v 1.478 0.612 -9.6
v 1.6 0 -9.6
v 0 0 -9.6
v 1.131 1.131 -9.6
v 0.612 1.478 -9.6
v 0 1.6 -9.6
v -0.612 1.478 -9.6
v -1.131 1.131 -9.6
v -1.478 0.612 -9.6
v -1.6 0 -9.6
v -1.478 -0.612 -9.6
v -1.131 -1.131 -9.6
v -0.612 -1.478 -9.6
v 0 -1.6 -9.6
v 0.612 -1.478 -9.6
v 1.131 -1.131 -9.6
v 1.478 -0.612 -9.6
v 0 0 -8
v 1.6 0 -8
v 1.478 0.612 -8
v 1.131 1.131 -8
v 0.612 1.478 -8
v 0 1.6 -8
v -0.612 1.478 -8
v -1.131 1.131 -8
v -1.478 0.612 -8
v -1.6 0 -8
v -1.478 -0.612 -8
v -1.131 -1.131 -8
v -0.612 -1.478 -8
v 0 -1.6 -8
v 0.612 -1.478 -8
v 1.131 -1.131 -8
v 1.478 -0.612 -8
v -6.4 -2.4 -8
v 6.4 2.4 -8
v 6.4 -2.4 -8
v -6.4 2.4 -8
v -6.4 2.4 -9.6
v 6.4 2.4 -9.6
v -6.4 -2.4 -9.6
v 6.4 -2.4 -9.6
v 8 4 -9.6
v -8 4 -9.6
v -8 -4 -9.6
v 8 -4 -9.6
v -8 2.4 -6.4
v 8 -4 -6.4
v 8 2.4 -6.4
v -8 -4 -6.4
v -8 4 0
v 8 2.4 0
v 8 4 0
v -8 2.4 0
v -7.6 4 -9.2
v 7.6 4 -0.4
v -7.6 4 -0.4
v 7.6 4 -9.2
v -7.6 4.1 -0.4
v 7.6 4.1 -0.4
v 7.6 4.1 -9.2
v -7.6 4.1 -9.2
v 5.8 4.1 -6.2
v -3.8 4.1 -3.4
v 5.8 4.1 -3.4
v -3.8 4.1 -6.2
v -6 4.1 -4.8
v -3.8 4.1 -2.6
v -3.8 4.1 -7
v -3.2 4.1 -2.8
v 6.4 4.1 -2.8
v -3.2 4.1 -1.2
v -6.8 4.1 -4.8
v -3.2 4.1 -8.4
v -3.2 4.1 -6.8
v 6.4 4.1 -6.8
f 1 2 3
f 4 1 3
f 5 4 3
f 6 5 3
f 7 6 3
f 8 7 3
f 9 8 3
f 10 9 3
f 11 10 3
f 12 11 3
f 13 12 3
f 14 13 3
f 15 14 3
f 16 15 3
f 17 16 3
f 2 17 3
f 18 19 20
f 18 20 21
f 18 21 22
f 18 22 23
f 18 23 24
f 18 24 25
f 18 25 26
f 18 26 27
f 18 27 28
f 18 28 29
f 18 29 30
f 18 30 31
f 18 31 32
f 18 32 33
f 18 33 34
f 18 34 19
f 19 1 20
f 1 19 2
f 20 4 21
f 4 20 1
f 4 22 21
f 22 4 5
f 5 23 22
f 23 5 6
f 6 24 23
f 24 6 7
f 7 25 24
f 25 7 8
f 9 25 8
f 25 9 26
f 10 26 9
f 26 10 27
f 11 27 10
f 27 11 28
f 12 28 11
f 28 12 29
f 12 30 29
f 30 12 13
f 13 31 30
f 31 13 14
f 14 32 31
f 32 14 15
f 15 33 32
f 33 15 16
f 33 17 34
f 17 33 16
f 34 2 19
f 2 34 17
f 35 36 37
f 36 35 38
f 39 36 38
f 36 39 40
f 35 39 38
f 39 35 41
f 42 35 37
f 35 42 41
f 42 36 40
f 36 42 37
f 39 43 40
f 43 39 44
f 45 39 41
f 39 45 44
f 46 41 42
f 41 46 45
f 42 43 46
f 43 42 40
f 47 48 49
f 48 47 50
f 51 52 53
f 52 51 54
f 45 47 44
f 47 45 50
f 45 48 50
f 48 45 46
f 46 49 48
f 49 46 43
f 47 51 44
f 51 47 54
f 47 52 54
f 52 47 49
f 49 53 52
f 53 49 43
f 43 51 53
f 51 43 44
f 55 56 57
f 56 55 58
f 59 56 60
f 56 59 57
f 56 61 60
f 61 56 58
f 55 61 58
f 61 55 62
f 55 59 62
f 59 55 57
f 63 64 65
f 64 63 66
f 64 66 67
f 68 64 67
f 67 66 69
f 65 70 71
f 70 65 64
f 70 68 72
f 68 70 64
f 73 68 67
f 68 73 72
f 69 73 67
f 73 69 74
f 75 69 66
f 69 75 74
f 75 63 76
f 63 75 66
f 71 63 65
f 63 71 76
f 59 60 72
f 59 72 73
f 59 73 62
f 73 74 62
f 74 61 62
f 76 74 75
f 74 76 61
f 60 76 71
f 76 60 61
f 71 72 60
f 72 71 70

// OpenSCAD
// file: ../p/4-4edge.scad
use <../lib.scad>
function ldraw_lib__4_4edge() = [
// 0 Circle 1.0
// 0 Name: 4-4edge.dat
// 0 Author: James Jessiman
// 0 !LDRAW_ORG Primitive UPDATE 2017-01
// 0 !LICENSE Licensed under CC BY 2.0 and CC BY 4.0 : see CAreadme.txt
// 
// 0 BFC CERTIFY CCW
  [0,"BFC","CERTIFY"],
  [0,"BFC","CCW"],
// 
// 0 !HISTORY 1998-12-15 [PTadmin] Official Update 1998-10
// 0 !HISTORY 2005-12-28 [PTadmin] Official Update 2005-01
// 0 !HISTORY 2007-06-24 [PTadmin] Header formatted for Contributor Agreement
// 0 !HISTORY 2008-07-01 [PTadmin] Official Update 2008-01
// 0 !HISTORY 2017-01-15 [Steffen] BFCed
// 0 !HISTORY 2017-12-30 [PTadmin] Official Update 2017-01
// 
// 
// 2 24 1 0 0 0.9239 0 0.3827
  [2,24,1,0,0,0.9239,0,0.3827],
// 2 24 0.9239 0 0.3827 0.7071 0 0.7071
  [2,24,0.9239,0,0.3827,0.7071,0,0.7071],
// 2 24 0.7071 0 0.7071 0.3827 0 0.9239
  [2,24,0.7071,0,0.7071,0.3827,0,0.9239],
// 2 24 0.3827 0 0.9239 0 0 1
  [2,24,0.3827,0,0.9239,0,0,1],
// 2 24 0 0 1 -0.3827 0 0.9239
  [2,24,0,0,1,-0.3827,0,0.9239],
// 2 24 -0.3827 0 0.9239 -0.7071 0 0.7071
  [2,24,-0.3827,0,0.9239,-0.7071,0,0.7071],
// 2 24 -0.7071 0 0.7071 -0.9239 0 0.3827
  [2,24,-0.7071,0,0.7071,-0.9239,0,0.3827],
// 2 24 -0.9239 0 0.3827 -1 0 -0
  [2,24,-0.9239,0,0.3827,-1,0,-0],
// 2 24 -1 0 -0 -0.9239 0 -0.3827
  [2,24,-1,0,-0,-0.9239,0,-0.3827],
// 2 24 -0.9239 0 -0.3827 -0.7071 0 -0.7071
  [2,24,-0.9239,0,-0.3827,-0.7071,0,-0.7071],
// 2 24 -0.7071 0 -0.7071 -0.3827 0 -0.9239
  [2,24,-0.7071,0,-0.7071,-0.3827,0,-0.9239],
// 2 24 -0.3827 0 -0.9239 0 0 -1
  [2,24,-0.3827,0,-0.9239,0,0,-1],
// 2 24 0 0 -1 0.3827 0 -0.9239
  [2,24,0,0,-1,0.3827,0,-0.9239],
// 2 24 0.3827 0 -0.9239 0.7071 0 -0.7071
  [2,24,0.3827,0,-0.9239,0.7071,0,-0.7071],
// 2 24 0.7071 0 -0.7071 0.9239 0 -0.3827
  [2,24,0.7071,0,-0.7071,0.9239,0,-0.3827],
// 2 24 0.9239 0 -0.3827 1 0 0
  [2,24,0.9239,0,-0.3827,1,0,0],
];
module ldraw_lib__4_4edge(step=0, col=false, unit=2/5, alt=false, line=0.2, solid=!$preview)
    makepoly(ldraw_lib__4_4edge(), step=step, col=col, unit=unit, alt=alt, line=line, solid=solid);
ldraw_lib__4_4edge(line=0.2);
// file: ../p/4-4disc.scad
use <../lib.scad>
function ldraw_lib__4_4disc() = [
// 0 Disc 1.0
// 0 Name: 4-4disc.dat
// 0 Author: James Jessiman
// 0 !LDRAW_ORG Primitive UPDATE 2002-02
// 0 !LICENSE Licensed under CC BY 2.0 and CC BY 4.0 : see CAreadme.txt
// 
// 0 BFC CERTIFY CCW
  [0,"BFC","CERTIFY"],
  [0,"BFC","CCW"],
// 
// 0 !HISTORY 1998-12-15 [PTadmin] Official Update 1998-10
// 0 !HISTORY 2002-03-23 [sbliss] Added BFC statement
// 0 !HISTORY 2002-04-25 [PTadmin] Official Update 2002-02
// 0 !HISTORY 2007-06-24 [PTadmin] Header formatted for Contributor Agreement
// 0 !HISTORY 2008-07-01 [PTadmin] Official Update 2008-01
// 
// 
// 3 16 0 0 0 1 0 0 0.9239 0 0.3827
  [3,16,0,0,0,1,0,0,0.9239,0,0.3827],
// 3 16 0 0 0 0.9239 0 0.3827 0.7071 0 0.7071
  [3,16,0,0,0,0.9239,0,0.3827,0.7071,0,0.7071],
// 3 16 0 0 0 0.7071 0 0.7071 0.3827 0 0.9239
  [3,16,0,0,0,0.7071,0,0.7071,0.3827,0,0.9239],
// 3 16 0 0 0 0.3827 0 0.9239 0 0 1
  [3,16,0,0,0,0.3827,0,0.9239,0,0,1],
// 3 16 0 0 0 0 0 1 -0.3827 0 0.9239
  [3,16,0,0,0,0,0,1,-0.3827,0,0.9239],
// 3 16 0 0 0 -0.3827 0 0.9239 -0.7071 0 0.7071
  [3,16,0,0,0,-0.3827,0,0.9239,-0.7071,0,0.7071],
// 3 16 0 0 0 -0.7071 0 0.7071 -0.9239 0 0.3827
  [3,16,0,0,0,-0.7071,0,0.7071,-0.9239,0,0.3827],
// 3 16 0 0 0 -0.9239 0 0.3827 -1 0 -0
  [3,16,0,0,0,-0.9239,0,0.3827,-1,0,-0],
// 3 16 0 0 0 -1 0 -0 -0.9239 0 -0.3827
  [3,16,0,0,0,-1,0,-0,-0.9239,0,-0.3827],
// 3 16 0 0 0 -0.9239 0 -0.3827 -0.7071 0 -0.7071
  [3,16,0,0,0,-0.9239,0,-0.3827,-0.7071,0,-0.7071],
// 3 16 0 0 0 -0.7071 0 -0.7071 -0.3827 0 -0.9239
  [3,16,0,0,0,-0.7071,0,-0.7071,-0.3827,0,-0.9239],
// 3 16 0 0 0 -0.3827 0 -0.9239 0 0 -1
  [3,16,0,0,0,-0.3827,0,-0.9239,0,0,-1],
// 3 16 0 0 0 0 0 -1 0.3827 0 -0.9239
  [3,16,0,0,0,0,0,-1,0.3827,0,-0.9239],
// 3 16 0 0 0 0.3827 0 -0.9239 0.7071 0 -0.7071
  [3,16,0,0,0,0.3827,0,-0.9239,0.7071,0,-0.7071],
// 3 16 0 0 0 0.7071 0 -0.7071 0.9239 0 -0.3827
  [3,16,0,0,0,0.7071,0,-0.7071,0.9239,0,-0.3827],
// 3 16 0 0 0 0.9239 0 -0.3827 1 0 0
  [3,16,0,0,0,0.9239,0,-0.3827,1,0,0],
// 0
];
module ldraw_lib__4_4disc(step=0, col=false, unit=2/5, alt=false, line=0.2, solid=!$preview)
    makepoly(ldraw_lib__4_4disc(), step=step, col=col, unit=unit, alt=alt, line=line, solid=solid);
ldraw_lib__4_4disc(line=0.2);
// file: ../p/4-4cyli.scad
use <../lib.scad>
$fa=1; $fs=0.2;
function ldraw_lib__4_4cyli(realsolid=false) = [
// 0 Cylinder 1.0
// 0 Name: 4-4cyli.dat
// 0 Author: James Jessiman
// 0 !LDRAW_ORG Primitive UPDATE 2005-01
// 0 !LICENSE Licensed under CC BY 2.0 and CC BY 4.0 : see CAreadme.txt
// 
// 0 BFC CERTIFY CCW
  [0,"BFC","CERTIFY"],
  [0,"BFC","CCW"],
// 
// 0 !HISTORY 1998-12-15 [PTadmin] Official Update 1998-10
// 0 !HISTORY 2002-03-23 [sbliss] Added BFC statement; merged headers from files in distributions LDraw 0.27 and Complete.
// 0 !HISTORY 2002-04-25 [PTadmin] Official Update 2002-02
// 0 !HISTORY 2004-12-14 [guyvivan] BFC CCW
// 0 !HISTORY 2005-12-28 [PTadmin] Official Update 2005-01
// 0 !HISTORY 2007-06-24 [PTadmin] Header formatted for Contributor Agreement
// 0 !HISTORY 2008-07-01 [PTadmin] Official Update 2008-01
// 
// 
// 4 16 1 1 0 0.9239 1 0.3827 0.9239 0 0.3827 1 0 0
  [4,16,1,1,0,0.9239,1,0.3827,0.9239,0,0.3827,1,0,0],
// 5 24 1 0 0 1 1 0 0.9239 0 0.3827 0.9239 0 -0.3827
  [5,24,1,0,0,1,1,0,0.9239,0,0.3827,0.9239,0,-0.3827],
// 4 16 0.9239 1 0.3827 0.7071 1 0.7071 0.7071 0 0.7071 0.9239 0 0.3827
  [4,16,0.9239,1,0.3827,0.7071,1,0.7071,0.7071,0,0.7071,0.9239,0,0.3827],
// 5 24 0.9239 0 0.3827 0.9239 1 0.3827 0.7071 0 0.7071 1 0 0
  [5,24,0.9239,0,0.3827,0.9239,1,0.3827,0.7071,0,0.7071,1,0,0],
// 4 16 0.7071 1 0.7071 0.3827 1 0.9239 0.3827 0 0.9239 0.7071 0 0.7071
  [4,16,0.7071,1,0.7071,0.3827,1,0.9239,0.3827,0,0.9239,0.7071,0,0.7071],
// 5 24 0.7071 0 0.7071 0.7071 1 0.7071 0.3827 0 0.9239 0.9239 0 0.3827
  [5,24,0.7071,0,0.7071,0.7071,1,0.7071,0.3827,0,0.9239,0.9239,0,0.3827],
// 4 16 0.3827 1 0.9239 0 1 1 0 0 1 0.3827 0 0.9239
  [4,16,0.3827,1,0.9239,0,1,1,0,0,1,0.3827,0,0.9239],
// 5 24 0.3827 0 0.9239 0.3827 1 0.9239 0 0 1 0.7071 0 0.7071
  [5,24,0.3827,0,0.9239,0.3827,1,0.9239,0,0,1,0.7071,0,0.7071],
// 4 16 0 1 1 -0.3827 1 0.9239 -0.3827 0 0.9239 0 0 1
  [4,16,0,1,1,-0.3827,1,0.9239,-0.3827,0,0.9239,0,0,1],
// 5 24 0 0 1 0 1 1 -0.3827 0 0.9239 0.3827 0 0.9239
  [5,24,0,0,1,0,1,1,-0.3827,0,0.9239,0.3827,0,0.9239],
// 4 16 -0.3827 1 0.9239 -0.7071 1 0.7071 -0.7071 0 0.7071 -0.3827 0 0.9239
  [4,16,-0.3827,1,0.9239,-0.7071,1,0.7071,-0.7071,0,0.7071,-0.3827,0,0.9239],
// 5 24 -0.3827 0 0.9239 -0.3827 1 0.9239 -0.7071 0 0.7071 0 0 1
  [5,24,-0.3827,0,0.9239,-0.3827,1,0.9239,-0.7071,0,0.7071,0,0,1],
// 4 16 -0.7071 1 0.7071 -0.9239 1 0.3827 -0.9239 0 0.3827 -0.7071 0 0.7071
  [4,16,-0.7071,1,0.7071,-0.9239,1,0.3827,-0.9239,0,0.3827,-0.7071,0,0.7071],
// 5 24 -0.7071 0 0.7071 -0.7071 1 0.7071 -0.9239 0 0.3827 -0.3827 0 0.9239
  [5,24,-0.7071,0,0.7071,-0.7071,1,0.7071,-0.9239,0,0.3827,-0.3827,0,0.9239],
// 4 16 -0.9239 1 0.3827 -1 1 0 -1 0 0 -0.9239 0 0.3827
  [4,16,-0.9239,1,0.3827,-1,1,0,-1,0,0,-0.9239,0,0.3827],
// 5 24 -0.9239 0 0.3827 -0.9239 1 0.3827 -1 0 0 -0.7071 0 0.7071
  [5,24,-0.9239,0,0.3827,-0.9239,1,0.3827,-1,0,0,-0.7071,0,0.7071],
// 4 16 -1 1 0 -0.9239 1 -0.3827 -0.9239 0 -0.3827 -1 0 0
  [4,16,-1,1,0,-0.9239,1,-0.3827,-0.9239,0,-0.3827,-1,0,0],
// 5 24 -1 0 0 -1 1 0 -0.9239 0 -0.3827 -0.9239 0 0.3827
  [5,24,-1,0,0,-1,1,0,-0.9239,0,-0.3827,-0.9239,0,0.3827],
// 4 16 -0.9239 1 -0.3827 -0.7071 1 -0.7071 -0.7071 0 -0.7071 -0.9239 0 -0.3827
  [4,16,-0.9239,1,-0.3827,-0.7071,1,-0.7071,-0.7071,0,-0.7071,-0.9239,0,-0.3827],
// 5 24 -0.9239 0 -0.3827 -0.9239 1 -0.3827 -0.7071 0 -0.7071 -1 0 0
  [5,24,-0.9239,0,-0.3827,-0.9239,1,-0.3827,-0.7071,0,-0.7071,-1,0,0],
// 4 16 -0.7071 1 -0.7071 -0.3827 1 -0.9239 -0.3827 0 -0.9239 -0.7071 0 -0.7071
  [4,16,-0.7071,1,-0.7071,-0.3827,1,-0.9239,-0.3827,0,-0.9239,-0.7071,0,-0.7071],
// 5 24 -0.7071 0 -0.7071 -0.7071 1 -0.7071 -0.3827 0 -0.9239 -0.9239 0 -0.3827
  [5,24,-0.7071,0,-0.7071,-0.7071,1,-0.7071,-0.3827,0,-0.9239,-0.9239,0,-0.3827],
// 4 16 -0.3827 1 -0.9239 0 1 -1 0 0 -1 -0.3827 0 -0.9239
  [4,16,-0.3827,1,-0.9239,0,1,-1,0,0,-1,-0.3827,0,-0.9239],
// 5 24 -0.3827 0 -0.9239 -0.3827 1 -0.9239 0 0 -1 -0.7071 0 -0.7071
  [5,24,-0.3827,0,-0.9239,-0.3827,1,-0.9239,0,0,-1,-0.7071,0,-0.7071],
// 4 16 0 1 -1 0.3827 1 -0.9239 0.3827 0 -0.9239 0 0 -1
  [4,16,0,1,-1,0.3827,1,-0.9239,0.3827,0,-0.9239,0,0,-1],
// 5 24 0 0 -1 0 1 -1 0.3827 0 -0.9239 -0.3827 0 -0.9239
  [5,24,0,0,-1,0,1,-1,0.3827,0,-0.9239,-0.3827,0,-0.9239],
// 4 16 0.3827 1 -0.9239 0.7071 1 -0.7071 0.7071 0 -0.7071 0.3827 0 -0.9239
  [4,16,0.3827,1,-0.9239,0.7071,1,-0.7071,0.7071,0,-0.7071,0.3827,0,-0.9239],
// 5 24 0.3827 0 -0.9239 0.3827 1 -0.9239 0.7071 0 -0.7071 0 0 -1
  [5,24,0.3827,0,-0.9239,0.3827,1,-0.9239,0.7071,0,-0.7071,0,0,-1],
// 4 16 0.7071 1 -0.7071 0.9239 1 -0.3827 0.9239 0 -0.3827 0.7071 0 -0.7071
  [4,16,0.7071,1,-0.7071,0.9239,1,-0.3827,0.9239,0,-0.3827,0.7071,0,-0.7071],
// 5 24 0.7071 0 -0.7071 0.7071 1 -0.7071 0.9239 0 -0.3827 0.3827 0 -0.9239
  [5,24,0.7071,0,-0.7071,0.7071,1,-0.7071,0.9239,0,-0.3827,0.3827,0,-0.9239],
// 4 16 0.9239 1 -0.3827 1 1 0 1 0 0 0.9239 0 -0.3827
  [4,16,0.9239,1,-0.3827,1,1,0,1,0,0,0.9239,0,-0.3827],
// 5 24 0.9239 0 -0.3827 0.9239 1 -0.3827 1 0 0 0.7071 0 -0.7071
  [5,24,0.9239,0,-0.3827,0.9239,1,-0.3827,1,0,0,0.7071,0,-0.7071],
// 0
];
module ldraw_lib__4_4cyli(step=0, col=false, unit=2/5, alt=false, line=0.2, solid=!$preview)
    makepoly(ldraw_lib__4_4cyli(solid), step=step, col=col, unit=unit, alt=alt, line=line, solid=solid);
ldraw_lib__4_4cyli(line=0.2);
// file: ../p/stud3.scad
use <../lib.scad>
use <4-4cyli.scad>
use <4-4disc.scad>
use <4-4edge.scad>
function ldraw_lib__stud3() = [
// 0 Stud Tube Solid
// 0 Name: stud3.dat
// 0 Author: James Jessiman
// 0 !LDRAW_ORG Primitive UPDATE 2012-01
// 0 !LICENSE Licensed under CC BY 4.0 : see CAreadme.txt
// 
// 0 BFC CERTIFY CCW
  [0,"BFC","CERTIFY"],
  [0,"BFC","CCW"],
// 
// 0 !HISTORY 2002-04-04 [sbliss] Modified for BFC compliance
// 0 !HISTORY 2002-04-25 [PTadmin] Official Update 2002-02
// 0 !HISTORY 2007-06-24 [PTadmin] Header formatted for Contributor Agreement
// 0 !HISTORY 2008-07-01 [PTadmin] Official Update 2008-01
// 0 !HISTORY 2012-02-16 [Philo] Changed to CCW
// 0 !HISTORY 2012-03-30 [PTadmin] Official Update 2012-01
// 
// 
// 1 16 0 -4 0 4 0 0 0 1 0 0 0 4 4-4edge.dat
  [1,16,0,-4,0,4,0,0,0,1,0,0,0,4, ldraw_lib__4_4edge()],
// 1 16 0 0 0 4 0 0 0 1 0 0 0 4 4-4edge.dat
  [1,16,0,0,0,4,0,0,0,1,0,0,0,4, ldraw_lib__4_4edge()],
// 1 16 0 -4 0 4 0 0 0 1 0 0 0 4 4-4disc.dat
  [1,16,0,-4,0,4,0,0,0,1,0,0,0,4, ldraw_lib__4_4disc()],
  [-1,16,0,0,0,4,0,0,0,-1,0,0,0,4, ldraw_lib__4_4disc()],
// 1 16 0 -4 0 4 0 0 0 4 0 0 0 4 4-4cyli.dat
  [1,16,0,-4,0,4,0,0,0,4,0,0,0,4, ldraw_lib__4_4cyli()],
];
module ldraw_lib__stud3(step=0, col=false, unit=2/5, alt=false, line=0.2, solid=!$preview)
    makepoly(ldraw_lib__stud3(), step=step, col=col, unit=unit, alt=alt, line=line, solid=solid);
ldraw_lib__stud3(line=0.2);
// file: ../p/box5.scad
use <../lib.scad>
function ldraw_lib__box5() = [
// 0 Box with 5 Faces and All Edges
// 0 Name: box5.dat
// 0 Author: James Jessiman
// 0 !LDRAW_ORG Primitive UPDATE 2012-01
// 0 !LICENSE Licensed under CC BY 2.0 and CC BY 4.0 : see CAreadme.txt
// 
// 0 BFC CERTIFY CCW
  [0,"BFC","CERTIFY"],
  [0,"BFC","CCW"],
// 
// 0 !HISTORY 2002-04-03 [sbliss] Modified for BFC compliance
// 0 !HISTORY 2002-04-25 [PTadmin] Official Update 2002-02
// 0 !HISTORY 2007-06-24 [PTadmin] Header formatted for Contributor Agreement
// 0 !HISTORY 2008-07-01 [PTadmin] Official Update 2008-01
// 0 !HISTORY 2012-02-16 [Philo] Changed to CCW
// 0 !HISTORY 2012-03-30 [PTadmin] Official Update 2012-01
// 
// 
// 2 24 1 1 1 -1 1 1
  [2,24,1,1,1,-1,1,1],
// 2 24 -1 1 1 -1 1 -1
  [2,24,-1,1,1,-1,1,-1],
// 2 24 -1 1 -1 1 1 -1
  [2,24,-1,1,-1,1,1,-1],
// 2 24 1 1 -1 1 1 1
  [2,24,1,1,-1,1,1,1],
// 2 24 1 0 1 -1 0 1
  [2,24,1,0,1,-1,0,1],
// 2 24 -1 0 1 -1 0 -1
  [2,24,-1,0,1,-1,0,-1],
// 2 24 -1 0 -1 1 0 -1
  [2,24,-1,0,-1,1,0,-1],
// 2 24 1 0 -1 1 0 1
  [2,24,1,0,-1,1,0,1],
// 2 24 1 0 1 1 1 1
  [2,24,1,0,1,1,1,1],
// 2 24 -1 0 1 -1 1 1
  [2,24,-1,0,1,-1,1,1],
// 2 24 1 0 -1 1 1 -1
  [2,24,1,0,-1,1,1,-1],
// 2 24 -1 0 -1 -1 1 -1
  [2,24,-1,0,-1,-1,1,-1],
// 4 16 -1 1 1 1 1 1 1 1 -1 -1 1 -1
  [4,16,-1,1,1,1,1,1,1,1,-1,-1,1,-1],
// 4 16 -1 1 1 -1 0 1 1 0 1 1 1 1
  [4,16,-1,1,1,-1,0,1,1,0,1,1,1,1],
// 4 16 -1 1 -1 -1 0 -1 -1 0 1 -1 1 1
  [4,16,-1,1,-1,-1,0,-1,-1,0,1,-1,1,1],
// 4 16 1 1 -1 1 0 -1 -1 0 -1 -1 1 -1
  [4,16,1,1,-1,1,0,-1,-1,0,-1,-1,1,-1],
// 4 16 1 1 1 1 0 1 1 0 -1 1 1 -1
  [4,16,1,1,1,1,0,1,1,0,-1,1,1,-1],
];
makepoly(ldraw_lib__box5(), line=0.2);
// file: s/4865as01.scad
use <../../lib.scad>
use <../../p/box5.scad>
use <../../p/stud3.scad>
function ldraw_lib__s__4865as01() = [
// 0 ~Panel  1 x  2 x  1 without Front Face
// 0 Name: s\4865as01.dat
// 0 Author: James Jessiman
// 0 !LDRAW_ORG Subpart UPDATE 2020-03
// 0 !LICENSE Licensed under CC BY 2.0 and CC BY 4.0 : see CAreadme.txt
// 
// 0 BFC CERTIFY CCW
  [0,"BFC","CERTIFY"],
  [0,"BFC","CCW"],
// 
// 0 !HISTORY 2003-07-03 [Steffen] BFCed, subfiled
// 0 !HISTORY 2004-04-22 [PTadmin] Official Update 2004-02
// 0 !HISTORY 2007-09-10 [PTadmin] Header formatted for Contributor Agreement
// 0 !HISTORY 2008-07-01 [PTadmin] Official Update 2008-01
// 0 !HISTORY 2020-07-14 [PTadmin] Renamed from s/4865s01
// 0 !HISTORY 2020-12-29 [PTadmin] Official Update 2020-03
// 
// 
// 1 16 0 20 0 1 0 0 0 -1 0 0 0 1 stud3.dat
  [1,16,0,20,0,1,0,0,0,-1,0,0,0,1, ldraw_lib__stud3()],
// 0 BFC INVERTNEXT
  [0,"BFC","INVERTNEXT"],
// 1 16 0 24 0 16 0 0 0 -4 0 0 0 6 box5.dat
  [1,16,0,24,0,16,0,0,0,-4,0,0,0,6, ldraw_lib__box5()],
// 4 16 20 24 10 16 24 6 -16 24 6 -20 24 10
  [4,16,20,24,10,16,24,6,-16,24,6,-20,24,10],
// 4 16 -20 24 10 -16 24 6 -16 24 -6 -20 24 -10
  [4,16,-20,24,10,-16,24,6,-16,24,-6,-20,24,-10],
// 4 16 -20 24 -10 -16 24 -6 16 24 -6 20 24 -10
  [4,16,-20,24,-10,-16,24,-6,16,24,-6,20,24,-10],
// 4 16 20 24 -10 16 24 -6 16 24 6 20 24 10
  [4,16,20,24,-10,16,24,-6,16,24,6,20,24,10],
// 2 24 20 24 10 -20 24 10
  [2,24,20,24,10,-20,24,10],
// 2 24 -20 24 10 -20 24 -10
  [2,24,-20,24,10,-20,24,-10],
// 2 24 -20 24 -10 20 24 -10
  [2,24,-20,24,-10,20,24,-10],
// 2 24 20 24 -10 20 24 10
  [2,24,20,24,-10,20,24,10],
// 2 24 20 16 6 -20 16 6
  [2,24,20,16,6,-20,16,6],
// 2 24 -20 16 6 -20 16 -10
  [2,24,-20,16,6,-20,16,-10],
// 2 24 -20 16 -10 20 16 -10
  [2,24,-20,16,-10,20,16,-10],
// 2 24 20 16 -10 20 16 6
  [2,24,20,16,-10,20,16,6],
// 2 24 20 0 10 -20 0 10
  [2,24,20,0,10,-20,0,10],
// 2 24 -20 0 10 -20 0 6
  [2,24,-20,0,10,-20,0,6],
// 2 24 -20 0 6 20 0 6
  [2,24,-20,0,6,20,0,6],
// 2 24 20 0 6 20 0 10
  [2,24,20,0,6,20,0,10],
// 2 24 20 0 6 20 16 6
  [2,24,20,0,6,20,16,6],
// 2 24 -20 0 6 -20 16 6
  [2,24,-20,0,6,-20,16,6],
// 2 24 20 16 -10 20 24 -10
  [2,24,20,16,-10,20,24,-10],
// 2 24 -20 16 -10 -20 24 -10
  [2,24,-20,16,-10,-20,24,-10],
// 2 24 20 0 10 20 24 10
  [2,24,20,0,10,20,24,10],
// 2 24 -20 0 10 -20 24 10
  [2,24,-20,0,10,-20,24,10],
// 4 16 20 16 -10 20 16 6 -20 16 6 -20 16 -10
  [4,16,20,16,-10,20,16,6,-20,16,6,-20,16,-10],
// 4 16 20 0 6 20 0 10 -20 0 10 -20 0 6
  [4,16,20,0,6,20,0,10,-20,0,10,-20,0,6],
// 4 16 -20 24 10 -20 24 -10 -20 16 -10 -20 16 6
  [4,16,-20,24,10,-20,24,-10,-20,16,-10,-20,16,6],
// 4 16 -20 24 -10 20 24 -10 20 16 -10 -20 16 -10
  [4,16,-20,24,-10,20,24,-10,20,16,-10,-20,16,-10],
// 4 16 20 24 -10 20 24 10 20 16 6 20 16 -10
  [4,16,20,24,-10,20,24,10,20,16,6,20,16,-10],
// 4 16 -20 24 10 -20 16 6 -20 0 6 -20 0 10
  [4,16,-20,24,10,-20,16,6,-20,0,6,-20,0,10],
// 4 16 -20 16 6 20 16 6 20 0 6 -20 0 6
  [4,16,-20,16,6,20,16,6,20,0,6,-20,0,6],
// 4 16 20 16 6 20 24 10 20 0 10 20 0 6
  [4,16,20,16,6,20,24,10,20,0,10,20,0,6],
// 0
];
makepoly(ldraw_lib__s__4865as01(), line=0.2);
// file: ../p/box5-12.scad
use <../lib.scad>
function ldraw_lib__box5_12() = [
// 0 Box with 5 Faces without Any Edges
// 0 Name: box5-12.dat
// 0 Author: Chris Dee [cwdee]
// 0 !LDRAW_ORG Primitive UPDATE 2009-02
// 0 !LICENSE Licensed under CC BY 2.0 and CC BY 4.0 : see CAreadme.txt
// 
// 0 BFC CERTIFY CCW
  [0,"BFC","CERTIFY"],
  [0,"BFC","CCW"],
// 
// 0 !HISTORY 2009-09-03 [PTadmin] Official Update 2009-02
// 
// 
// 4 16 1 1 1 1 1 -1 -1 1 -1 -1 1 1
  [4,16,1,1,1,1,1,-1,-1,1,-1,-1,1,1],
// 4 16 -1 0 1 1 0 1 1 1 1 -1 1 1
  [4,16,-1,0,1,1,0,1,1,1,1,-1,1,1],
// 4 16 -1 0 -1 -1 0 1 -1 1 1 -1 1 -1
  [4,16,-1,0,-1,-1,0,1,-1,1,1,-1,1,-1],
// 4 16 1 0 -1 -1 0 -1 -1 1 -1 1 1 -1
  [4,16,1,0,-1,-1,0,-1,-1,1,-1,1,1,-1],
// 4 16 1 0 1 1 0 -1 1 1 -1 1 1 1
  [4,16,1,0,1,1,0,-1,1,1,-1,1,1,1],
// 0
];
module ldraw_lib__box5_12(step=0, col=false, unit=2/5, alt=false, line=0.2, solid=!$preview)
    makepoly(ldraw_lib__box5_12(), step=step, col=col, unit=unit, alt=alt, line=line, solid=solid);
ldraw_lib__box5_12(line=0.2);
// file: 4865a.scad
use <../lib.scad>
use <s/4865as01.scad>
function ldraw_lib__4865a() = [
// 0 Panel  1 x  2 x  1 with Square Corners
// 0 Name: 4865a.dat
// 0 Author: James Jessiman
// 0 !LDRAW_ORG Part UPDATE 2020-03
// 0 !LICENSE Licensed under CC BY 4.0 : see CAreadme.txt
// 
// 0 BFC CERTIFY CCW
  [0,"BFC","CERTIFY"],
  [0,"BFC","CCW"],
// 
// 0 !KEYWORDS BrickLink 4865
// 
// 0 !PREVIEW 16 0 0 0 -1 0 0 0 1 0 0 0 -1
// 
// 0 !HISTORY 2003-07-03 [Steffen] BFCed, subfiled
// 0 !HISTORY 2004-04-22 [PTadmin] Official Update 2004-02
// 0 !HISTORY 2007-07-09 [PTadmin] Header formatted for Contributor Agreement
// 0 !HISTORY 2008-07-01 [PTadmin] Official Update 2008-01
// 0 !HISTORY 2011-12-08 [PTadmin] Renamed from 4865
// 0 !HISTORY 2011-12-29 [PTadmin] Official Update 2011-02
// 0 !HISTORY 2020-08-01 [cwdee] Use renamed subfile
// 0 !HISTORY 2020-12-29 [PTadmin] Official Update 2020-03
// 
// 
// 1 16 0 0 0 1 0 0 0 1 0 0 0 1 s\4865as01.dat
  [1,16,0,0,0,1,0,0,0,1,0,0,0,1, ldraw_lib__s__4865as01()],
// 4 16 20 24 10 -20 24 10 -20 0 10 20 0 10
  [4,16,20,24,10,-20,24,10,-20,0,10,20,0,10],
// 
];
module ldraw_lib__4865a(step=0, col=false, unit=2/5, alt=false, line=0.2, solid=!$preview)
    makepoly(ldraw_lib__4865a(), step=step, col=col, unit=unit, alt=alt, line=line, solid=solid);
ldraw_lib__4865a(line=0.2);
// file: 164525a.scad
use <../lib.scad>
use <../p/box5-12.scad>
function ldraw_lib__164525a() = [
// 0 Sticker  1.1 x  1.9 with Yellow Arrow on Light Grey Background
// 0 Name: 164525a.dat
// 0 Author: Takeshi Takahashi [RainbowDolphin]
// 0 !LDRAW_ORG Part UPDATE 2025-03
// 0 !LICENSE Licensed under CC BY 4.0 : see CAreadme.txt
// 
// 0 BFC CERTIFY CCW
  [0,"BFC","CERTIFY"],
  [0,"BFC","CCW"],
// 
// 0 !KEYWORDS helicopter, Set 8856, Technic, Whirlwind rescue
// 
// 0 !HISTORY 2025-03-30 [OrionP] Official Update 2025-03
// 
// 1 16 0 -0.25 0 19 0 0 0 0.25 0 0 0 11 box5-12.dat
  [1,16,0,-0.25,0,19,0,0,0,0.25,0,0,0,11, ldraw_lib__box5_12()],
// 4 14 9.5 -0.25 3.5 -14.5 -0.25 3.5 -14.5 -0.25 -3.5 9.5 -0.25 -3.5
  [4,14,9.5,-0.25,3.5,-14.5,-0.25,3.5,-14.5,-0.25,-3.5,9.5,-0.25,-3.5],
// 3 14 9.5 -0.25 3.5 9.5 -0.25 -3.5 15 -0.25 0
  [3,14,9.5,-0.25,3.5,9.5,-0.25,-3.5,15,-0.25,0],
// 3 14 9.5 -0.25 5.5 9.5 -0.25 3.5 15 -0.25 0
  [3,14,9.5,-0.25,5.5,9.5,-0.25,3.5,15,-0.25,0],
// 3 14 15 -0.25 0 9.5 -0.25 -3.5 9.5 -0.25 -5.5
  [3,14,15,-0.25,0,9.5,-0.25,-3.5,9.5,-0.25,-5.5],
// 4 0 8 -0.25 5 -16 -0.25 5 -14.5 -0.25 3.5 9.5 -0.25 3.5
  [4,0,8,-0.25,5,-16,-0.25,5,-14.5,-0.25,3.5,9.5,-0.25,3.5],
// 4 0 8 -0.25 5 9.5 -0.25 3.5 9.5 -0.25 5.5 8 -0.25 9
  [4,0,8,-0.25,5,9.5,-0.25,3.5,9.5,-0.25,5.5,8,-0.25,9],
// 4 0 17 -0.25 0 8 -0.25 9 9.5 -0.25 5.5 15 -0.25 0
  [4,0,17,-0.25,0,8,-0.25,9,9.5,-0.25,5.5,15,-0.25,0],
// 4 0 17 -0.25 0 15 -0.25 0 9.5 -0.25 -5.5 8 -0.25 -9
  [4,0,17,-0.25,0,15,-0.25,0,9.5,-0.25,-5.5,8,-0.25,-9],
// 4 0 8 -0.25 -5 8 -0.25 -9 9.5 -0.25 -5.5 9.5 -0.25 -3.5
  [4,0,8,-0.25,-5,8,-0.25,-9,9.5,-0.25,-5.5,9.5,-0.25,-3.5],
// 4 0 8 -0.25 -5 9.5 -0.25 -3.5 -14.5 -0.25 -3.5 -16 -0.25 -5
  [4,0,8,-0.25,-5,9.5,-0.25,-3.5,-14.5,-0.25,-3.5,-16,-0.25,-5],
// 4 0 -16 -0.25 5 -16 -0.25 -5 -14.5 -0.25 -3.5 -14.5 -0.25 3.5
  [4,0,-16,-0.25,5,-16,-0.25,-5,-14.5,-0.25,-3.5,-14.5,-0.25,3.5],
// 3 7 19 -0.25 11 -19 -0.25 11 8 -0.25 9
  [3,7,19,-0.25,11,-19,-0.25,11,8,-0.25,9],
// 3 7 19 -0.25 11 8 -0.25 9 17 -0.25 0
  [3,7,19,-0.25,11,8,-0.25,9,17,-0.25,0],
// 3 7 19 -0.25 11 17 -0.25 0 19 -0.25 -11
  [3,7,19,-0.25,11,17,-0.25,0,19,-0.25,-11],
// 3 7 17 -0.25 0 8 -0.25 -9 19 -0.25 -11
  [3,7,17,-0.25,0,8,-0.25,-9,19,-0.25,-11],
// 3 7 8 -0.25 -9 -19 -0.25 -11 19 -0.25 -11
  [3,7,8,-0.25,-9,-19,-0.25,-11,19,-0.25,-11],
// 4 7 -19 -0.25 -11 8 -0.25 -9 8 -0.25 -5 -16 -0.25 -5
  [4,7,-19,-0.25,-11,8,-0.25,-9,8,-0.25,-5,-16,-0.25,-5],
// 4 7 -19 -0.25 -11 -16 -0.25 -5 -16 -0.25 5 -19 -0.25 11
  [4,7,-19,-0.25,-11,-16,-0.25,-5,-16,-0.25,5,-19,-0.25,11],
// 4 7 -19 -0.25 11 -16 -0.25 5 8 -0.25 5 8 -0.25 9
  [4,7,-19,-0.25,11,-16,-0.25,5,8,-0.25,5,8,-0.25,9],
];
module ldraw_lib__164525a(step=0, col=false, unit=2/5, alt=false, line=0.2, solid=!$preview)
    makepoly(ldraw_lib__164525a(), step=step, col=col, unit=unit, alt=alt, line=line, solid=solid);
ldraw_lib__164525a(line=0.2);
// main file
use <../lib.scad>
use <164525a.scad>
use <4865a.scad>
function ldraw_lib__4865ad03() = [
// 0 Panel  1 x  2 x  1 with Yellow Arrow on Light Grey Sticker
// 0 Name: 4865ad03.dat
// 0 Author: Takeshi Takahashi [RainbowDolphin]
// 0 !LDRAW_ORG Shortcut UPDATE 2025-03
// 0 !LICENSE Licensed under CC BY 4.0 : see CAreadme.txt
// 
// 0 BFC CERTIFY CCW
  [0,"BFC","CERTIFY"],
  [0,"BFC","CCW"],
// 
// 0 !CATEGORY Sticker Shortcut
// 0 !KEYWORDS Bricklink 4865pb022, helicopter, Set 8856, Technic, Whirlwind rescue
// 
// 0 !PREVIEW 16 0 0 0 -1 0 0 0 1 0 0 0 -1
// 
// 0 !HISTORY 2025-03-30 [OrionP] Official Update 2025-03
// 
// 1 16 0 0 0 1 0 0 0 1 0 0 0 1 4865a.dat
  [1,16,0,0,0,1,0,0,0,1,0,0,0,1, ldraw_lib__4865a()],
// 1 16 0 12 10 -1 0 0 0 0 -1 0 -1 0 164525a.dat
  [1,16,0,12,10,-1,0,0,0,0,-1,0,-1,0, ldraw_lib__164525a()],
];
module ldraw_lib__4865ad03(step=0, col=false, unit=2/5, alt=false, line=0.2, solid=!$preview)
    makepoly(ldraw_lib__4865ad03(), step=step, col=col, unit=unit, alt=alt, line=line, solid=solid);
ldraw_lib__4865ad03(line=0.2);
